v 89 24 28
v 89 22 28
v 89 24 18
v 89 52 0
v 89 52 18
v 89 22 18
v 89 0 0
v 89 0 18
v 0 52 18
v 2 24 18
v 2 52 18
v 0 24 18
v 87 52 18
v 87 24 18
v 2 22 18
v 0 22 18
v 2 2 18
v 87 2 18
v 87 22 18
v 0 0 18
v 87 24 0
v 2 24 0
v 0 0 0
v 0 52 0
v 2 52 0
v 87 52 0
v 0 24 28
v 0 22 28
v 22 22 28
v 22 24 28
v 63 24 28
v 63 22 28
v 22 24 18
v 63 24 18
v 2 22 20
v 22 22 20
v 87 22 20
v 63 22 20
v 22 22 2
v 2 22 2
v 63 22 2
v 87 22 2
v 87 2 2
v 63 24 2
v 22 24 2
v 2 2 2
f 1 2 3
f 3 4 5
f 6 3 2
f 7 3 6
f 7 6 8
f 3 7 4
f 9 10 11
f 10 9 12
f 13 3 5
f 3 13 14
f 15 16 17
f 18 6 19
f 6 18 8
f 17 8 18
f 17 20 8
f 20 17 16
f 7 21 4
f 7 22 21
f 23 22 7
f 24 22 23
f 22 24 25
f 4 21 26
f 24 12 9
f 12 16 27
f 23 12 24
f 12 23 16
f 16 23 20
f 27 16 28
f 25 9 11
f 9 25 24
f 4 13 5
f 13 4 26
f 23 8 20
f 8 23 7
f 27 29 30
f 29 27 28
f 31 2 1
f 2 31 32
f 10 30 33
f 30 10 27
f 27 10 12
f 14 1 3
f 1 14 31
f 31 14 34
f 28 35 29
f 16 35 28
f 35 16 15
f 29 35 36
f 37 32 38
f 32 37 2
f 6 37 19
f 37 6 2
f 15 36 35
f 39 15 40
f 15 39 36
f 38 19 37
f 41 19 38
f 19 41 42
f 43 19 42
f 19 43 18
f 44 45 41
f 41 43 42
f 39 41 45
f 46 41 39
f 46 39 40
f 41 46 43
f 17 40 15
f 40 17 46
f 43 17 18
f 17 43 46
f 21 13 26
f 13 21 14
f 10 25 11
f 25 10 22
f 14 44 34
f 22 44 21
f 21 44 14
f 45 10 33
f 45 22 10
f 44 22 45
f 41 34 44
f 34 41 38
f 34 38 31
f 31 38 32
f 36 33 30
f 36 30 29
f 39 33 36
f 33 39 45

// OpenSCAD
// Holder/stand for my Casio fx-300
// was designed to be wedged between two workstations
// works as a desktop stand as well

width = 2;

difference(){
    // Main cube total size
    union(){
        cube([
            85 + 2*width,
            50 + width,
            18,
        ]);
        translate([0, 20 + width, 18])
            cube([
                85 + 2*width,
                width,
                10
            ]);
    }
    // Box in front for calc
    translate([width, width, width])
        cube([
            85,
            20,
            18,
        ]);
    // Cut up back to minimize
    translate([width, 20 + 2*width, 0])
        cube([
            85,
            30,
            18,
        ]);
    // Notch out a bit more
    translate([20 + width, width, width])
        cube([
            85 - (40 + 2*width),
            30,
            40,
        ]);
}
